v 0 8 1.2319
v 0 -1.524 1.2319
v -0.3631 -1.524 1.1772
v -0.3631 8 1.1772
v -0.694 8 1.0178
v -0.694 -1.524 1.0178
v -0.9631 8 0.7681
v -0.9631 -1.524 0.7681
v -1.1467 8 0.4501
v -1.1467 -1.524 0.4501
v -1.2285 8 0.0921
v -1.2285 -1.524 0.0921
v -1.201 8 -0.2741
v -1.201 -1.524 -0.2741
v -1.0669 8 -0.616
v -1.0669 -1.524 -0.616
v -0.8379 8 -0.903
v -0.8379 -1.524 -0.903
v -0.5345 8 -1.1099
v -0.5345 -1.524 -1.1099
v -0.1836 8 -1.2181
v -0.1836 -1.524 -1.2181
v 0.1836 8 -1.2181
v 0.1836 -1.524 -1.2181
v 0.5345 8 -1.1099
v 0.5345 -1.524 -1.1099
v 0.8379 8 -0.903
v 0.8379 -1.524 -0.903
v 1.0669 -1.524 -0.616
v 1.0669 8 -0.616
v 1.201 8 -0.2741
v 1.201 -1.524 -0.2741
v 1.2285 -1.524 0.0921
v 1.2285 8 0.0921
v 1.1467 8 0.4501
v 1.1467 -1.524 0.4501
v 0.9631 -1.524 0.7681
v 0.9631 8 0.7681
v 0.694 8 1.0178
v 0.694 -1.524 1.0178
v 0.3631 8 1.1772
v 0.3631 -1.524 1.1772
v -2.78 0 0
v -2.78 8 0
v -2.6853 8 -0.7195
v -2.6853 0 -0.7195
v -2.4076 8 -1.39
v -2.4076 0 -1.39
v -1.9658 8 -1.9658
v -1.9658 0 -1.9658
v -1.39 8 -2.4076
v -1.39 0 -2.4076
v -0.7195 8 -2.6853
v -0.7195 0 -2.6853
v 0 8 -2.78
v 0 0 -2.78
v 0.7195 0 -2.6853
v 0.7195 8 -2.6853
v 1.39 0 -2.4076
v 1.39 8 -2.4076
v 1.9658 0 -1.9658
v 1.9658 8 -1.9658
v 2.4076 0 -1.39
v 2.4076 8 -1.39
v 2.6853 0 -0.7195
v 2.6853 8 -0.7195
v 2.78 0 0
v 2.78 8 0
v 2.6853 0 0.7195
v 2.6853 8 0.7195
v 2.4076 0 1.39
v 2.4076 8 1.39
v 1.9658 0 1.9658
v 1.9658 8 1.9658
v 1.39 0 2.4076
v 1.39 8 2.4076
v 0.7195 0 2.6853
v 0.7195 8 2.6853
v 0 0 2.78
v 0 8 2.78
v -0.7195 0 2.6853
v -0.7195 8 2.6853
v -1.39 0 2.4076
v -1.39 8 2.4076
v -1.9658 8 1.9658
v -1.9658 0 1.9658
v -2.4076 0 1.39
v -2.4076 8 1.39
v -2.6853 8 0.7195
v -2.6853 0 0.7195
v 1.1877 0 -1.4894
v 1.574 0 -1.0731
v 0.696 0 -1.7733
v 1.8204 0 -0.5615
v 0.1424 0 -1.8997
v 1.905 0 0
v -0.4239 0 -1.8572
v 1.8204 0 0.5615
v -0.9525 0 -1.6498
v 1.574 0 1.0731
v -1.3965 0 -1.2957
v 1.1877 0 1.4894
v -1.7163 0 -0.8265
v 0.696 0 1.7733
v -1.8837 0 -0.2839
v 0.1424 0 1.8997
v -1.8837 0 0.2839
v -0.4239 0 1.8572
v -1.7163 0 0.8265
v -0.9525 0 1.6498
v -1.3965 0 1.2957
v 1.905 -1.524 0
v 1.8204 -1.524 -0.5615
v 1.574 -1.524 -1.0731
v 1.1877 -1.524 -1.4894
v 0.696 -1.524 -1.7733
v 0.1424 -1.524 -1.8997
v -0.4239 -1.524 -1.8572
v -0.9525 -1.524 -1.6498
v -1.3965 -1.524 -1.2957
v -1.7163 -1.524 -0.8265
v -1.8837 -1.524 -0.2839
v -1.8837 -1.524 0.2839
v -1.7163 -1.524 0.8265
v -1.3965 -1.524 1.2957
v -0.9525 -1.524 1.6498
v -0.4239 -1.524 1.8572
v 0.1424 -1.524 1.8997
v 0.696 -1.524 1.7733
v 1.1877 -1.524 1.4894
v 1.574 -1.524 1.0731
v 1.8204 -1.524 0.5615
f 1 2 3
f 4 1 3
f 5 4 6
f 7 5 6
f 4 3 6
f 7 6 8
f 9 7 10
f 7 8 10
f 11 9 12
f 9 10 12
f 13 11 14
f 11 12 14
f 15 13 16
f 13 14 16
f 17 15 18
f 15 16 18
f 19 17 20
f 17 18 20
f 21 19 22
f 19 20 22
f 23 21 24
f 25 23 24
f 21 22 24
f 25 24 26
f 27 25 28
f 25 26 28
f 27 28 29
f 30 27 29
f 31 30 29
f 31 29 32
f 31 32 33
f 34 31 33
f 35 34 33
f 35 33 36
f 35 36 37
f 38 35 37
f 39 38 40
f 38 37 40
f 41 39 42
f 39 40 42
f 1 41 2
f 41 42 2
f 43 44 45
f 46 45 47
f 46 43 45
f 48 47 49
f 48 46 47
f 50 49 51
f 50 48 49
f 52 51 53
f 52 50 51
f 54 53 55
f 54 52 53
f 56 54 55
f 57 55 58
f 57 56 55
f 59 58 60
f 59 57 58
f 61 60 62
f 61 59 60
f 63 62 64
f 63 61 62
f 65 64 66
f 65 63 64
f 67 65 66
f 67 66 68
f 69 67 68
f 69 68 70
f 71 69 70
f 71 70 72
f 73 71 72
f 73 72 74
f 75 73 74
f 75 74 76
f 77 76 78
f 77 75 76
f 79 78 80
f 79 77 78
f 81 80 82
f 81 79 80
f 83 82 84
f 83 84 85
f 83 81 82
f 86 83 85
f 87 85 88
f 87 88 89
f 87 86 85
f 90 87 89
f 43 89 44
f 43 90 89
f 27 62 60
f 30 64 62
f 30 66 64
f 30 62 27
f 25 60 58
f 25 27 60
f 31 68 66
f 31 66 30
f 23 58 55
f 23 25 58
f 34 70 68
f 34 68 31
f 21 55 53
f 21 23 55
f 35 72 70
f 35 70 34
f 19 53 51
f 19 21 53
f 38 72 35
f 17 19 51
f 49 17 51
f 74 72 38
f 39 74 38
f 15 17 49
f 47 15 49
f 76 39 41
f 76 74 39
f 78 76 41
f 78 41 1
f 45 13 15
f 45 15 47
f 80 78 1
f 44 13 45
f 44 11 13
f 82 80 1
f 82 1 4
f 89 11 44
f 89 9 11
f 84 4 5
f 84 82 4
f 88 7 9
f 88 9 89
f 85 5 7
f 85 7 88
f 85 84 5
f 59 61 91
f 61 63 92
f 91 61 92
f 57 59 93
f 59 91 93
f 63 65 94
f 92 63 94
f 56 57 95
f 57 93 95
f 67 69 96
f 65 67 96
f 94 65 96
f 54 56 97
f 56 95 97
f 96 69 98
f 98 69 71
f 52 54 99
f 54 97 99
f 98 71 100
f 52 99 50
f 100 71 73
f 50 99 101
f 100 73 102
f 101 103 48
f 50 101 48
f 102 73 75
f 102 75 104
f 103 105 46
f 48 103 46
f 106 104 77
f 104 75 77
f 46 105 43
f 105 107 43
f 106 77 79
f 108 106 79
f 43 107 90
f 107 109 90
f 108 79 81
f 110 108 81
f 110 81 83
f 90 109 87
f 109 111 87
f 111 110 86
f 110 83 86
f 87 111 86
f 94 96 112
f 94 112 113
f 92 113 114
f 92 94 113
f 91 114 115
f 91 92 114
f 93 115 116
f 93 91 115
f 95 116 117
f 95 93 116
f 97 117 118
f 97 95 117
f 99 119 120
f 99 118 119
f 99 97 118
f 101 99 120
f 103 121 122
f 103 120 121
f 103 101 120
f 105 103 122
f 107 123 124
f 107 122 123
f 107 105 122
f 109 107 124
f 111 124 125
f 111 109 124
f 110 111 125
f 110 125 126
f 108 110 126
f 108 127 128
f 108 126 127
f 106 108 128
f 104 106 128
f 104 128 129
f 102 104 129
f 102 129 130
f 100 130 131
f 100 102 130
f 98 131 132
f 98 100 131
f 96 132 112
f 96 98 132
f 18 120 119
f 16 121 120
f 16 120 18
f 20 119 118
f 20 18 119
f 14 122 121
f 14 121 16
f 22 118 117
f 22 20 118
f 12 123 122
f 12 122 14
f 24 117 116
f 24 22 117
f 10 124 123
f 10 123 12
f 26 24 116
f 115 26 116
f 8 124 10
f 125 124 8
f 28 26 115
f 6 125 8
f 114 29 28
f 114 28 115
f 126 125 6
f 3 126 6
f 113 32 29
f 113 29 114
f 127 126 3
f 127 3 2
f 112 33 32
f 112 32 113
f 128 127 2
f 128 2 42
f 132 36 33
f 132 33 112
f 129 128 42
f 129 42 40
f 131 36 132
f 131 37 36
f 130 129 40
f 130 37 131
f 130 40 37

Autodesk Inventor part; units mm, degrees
ref_plane "YZ Plane" through (0, 0, 0) normal (1, 0, 0) x (0, 1, 0)
ref_plane "XZ Plane" through (0, 0, 0) normal (0, 1, 0) x (-1, 0, 0)
ref_plane "XY Plane" through (0, 0, 0) normal (0, 0, 1) x (1, 0, 0)
sketch "Sketch1" plane through (0, 0, 0) normal (0, 1, 0) x (-1, 0, 0)
  circle A0 centre (0, 0) radius 2.78
  circle A1 centre (0, 0) radius 2.045
  dimension "d0" = 5.56
  dimension "d1" = 4.09
extrude "Extrusion1" add sketch "Sketch1" along normal blind 8
sketch "Sketch2" plane through (0, 0, 0) normal (0, -1, 0) x (1, 0, 0)
  circle A0 centre (0, 0) radius 1.905
  dimension "d4" = 3.81
extrude "Extrusion2" add sketch "Sketch2" along normal blind 1.524
sketch "Sketch3" plane through (0, 0, 0) normal (0, -1, 0) x (1, 0, 0)
  circle A0 centre (0, 0) radius 2.78
extrude "Extrusion3" add sketch "Sketch3" against normal up to surface (8 mm away)
sketch "Sketch4" plane through (0, 8, 0) normal (0, 1, 0) x (1, 0, 0)
  point P0 (0, 0)
  point P1 (0, 0)
hole "Hole1" at (0, 8, 0) direction (0, -1, 0) diameter 2.4638 end through all
properties part number "Keystone24884" material "Aluminum 6061"
